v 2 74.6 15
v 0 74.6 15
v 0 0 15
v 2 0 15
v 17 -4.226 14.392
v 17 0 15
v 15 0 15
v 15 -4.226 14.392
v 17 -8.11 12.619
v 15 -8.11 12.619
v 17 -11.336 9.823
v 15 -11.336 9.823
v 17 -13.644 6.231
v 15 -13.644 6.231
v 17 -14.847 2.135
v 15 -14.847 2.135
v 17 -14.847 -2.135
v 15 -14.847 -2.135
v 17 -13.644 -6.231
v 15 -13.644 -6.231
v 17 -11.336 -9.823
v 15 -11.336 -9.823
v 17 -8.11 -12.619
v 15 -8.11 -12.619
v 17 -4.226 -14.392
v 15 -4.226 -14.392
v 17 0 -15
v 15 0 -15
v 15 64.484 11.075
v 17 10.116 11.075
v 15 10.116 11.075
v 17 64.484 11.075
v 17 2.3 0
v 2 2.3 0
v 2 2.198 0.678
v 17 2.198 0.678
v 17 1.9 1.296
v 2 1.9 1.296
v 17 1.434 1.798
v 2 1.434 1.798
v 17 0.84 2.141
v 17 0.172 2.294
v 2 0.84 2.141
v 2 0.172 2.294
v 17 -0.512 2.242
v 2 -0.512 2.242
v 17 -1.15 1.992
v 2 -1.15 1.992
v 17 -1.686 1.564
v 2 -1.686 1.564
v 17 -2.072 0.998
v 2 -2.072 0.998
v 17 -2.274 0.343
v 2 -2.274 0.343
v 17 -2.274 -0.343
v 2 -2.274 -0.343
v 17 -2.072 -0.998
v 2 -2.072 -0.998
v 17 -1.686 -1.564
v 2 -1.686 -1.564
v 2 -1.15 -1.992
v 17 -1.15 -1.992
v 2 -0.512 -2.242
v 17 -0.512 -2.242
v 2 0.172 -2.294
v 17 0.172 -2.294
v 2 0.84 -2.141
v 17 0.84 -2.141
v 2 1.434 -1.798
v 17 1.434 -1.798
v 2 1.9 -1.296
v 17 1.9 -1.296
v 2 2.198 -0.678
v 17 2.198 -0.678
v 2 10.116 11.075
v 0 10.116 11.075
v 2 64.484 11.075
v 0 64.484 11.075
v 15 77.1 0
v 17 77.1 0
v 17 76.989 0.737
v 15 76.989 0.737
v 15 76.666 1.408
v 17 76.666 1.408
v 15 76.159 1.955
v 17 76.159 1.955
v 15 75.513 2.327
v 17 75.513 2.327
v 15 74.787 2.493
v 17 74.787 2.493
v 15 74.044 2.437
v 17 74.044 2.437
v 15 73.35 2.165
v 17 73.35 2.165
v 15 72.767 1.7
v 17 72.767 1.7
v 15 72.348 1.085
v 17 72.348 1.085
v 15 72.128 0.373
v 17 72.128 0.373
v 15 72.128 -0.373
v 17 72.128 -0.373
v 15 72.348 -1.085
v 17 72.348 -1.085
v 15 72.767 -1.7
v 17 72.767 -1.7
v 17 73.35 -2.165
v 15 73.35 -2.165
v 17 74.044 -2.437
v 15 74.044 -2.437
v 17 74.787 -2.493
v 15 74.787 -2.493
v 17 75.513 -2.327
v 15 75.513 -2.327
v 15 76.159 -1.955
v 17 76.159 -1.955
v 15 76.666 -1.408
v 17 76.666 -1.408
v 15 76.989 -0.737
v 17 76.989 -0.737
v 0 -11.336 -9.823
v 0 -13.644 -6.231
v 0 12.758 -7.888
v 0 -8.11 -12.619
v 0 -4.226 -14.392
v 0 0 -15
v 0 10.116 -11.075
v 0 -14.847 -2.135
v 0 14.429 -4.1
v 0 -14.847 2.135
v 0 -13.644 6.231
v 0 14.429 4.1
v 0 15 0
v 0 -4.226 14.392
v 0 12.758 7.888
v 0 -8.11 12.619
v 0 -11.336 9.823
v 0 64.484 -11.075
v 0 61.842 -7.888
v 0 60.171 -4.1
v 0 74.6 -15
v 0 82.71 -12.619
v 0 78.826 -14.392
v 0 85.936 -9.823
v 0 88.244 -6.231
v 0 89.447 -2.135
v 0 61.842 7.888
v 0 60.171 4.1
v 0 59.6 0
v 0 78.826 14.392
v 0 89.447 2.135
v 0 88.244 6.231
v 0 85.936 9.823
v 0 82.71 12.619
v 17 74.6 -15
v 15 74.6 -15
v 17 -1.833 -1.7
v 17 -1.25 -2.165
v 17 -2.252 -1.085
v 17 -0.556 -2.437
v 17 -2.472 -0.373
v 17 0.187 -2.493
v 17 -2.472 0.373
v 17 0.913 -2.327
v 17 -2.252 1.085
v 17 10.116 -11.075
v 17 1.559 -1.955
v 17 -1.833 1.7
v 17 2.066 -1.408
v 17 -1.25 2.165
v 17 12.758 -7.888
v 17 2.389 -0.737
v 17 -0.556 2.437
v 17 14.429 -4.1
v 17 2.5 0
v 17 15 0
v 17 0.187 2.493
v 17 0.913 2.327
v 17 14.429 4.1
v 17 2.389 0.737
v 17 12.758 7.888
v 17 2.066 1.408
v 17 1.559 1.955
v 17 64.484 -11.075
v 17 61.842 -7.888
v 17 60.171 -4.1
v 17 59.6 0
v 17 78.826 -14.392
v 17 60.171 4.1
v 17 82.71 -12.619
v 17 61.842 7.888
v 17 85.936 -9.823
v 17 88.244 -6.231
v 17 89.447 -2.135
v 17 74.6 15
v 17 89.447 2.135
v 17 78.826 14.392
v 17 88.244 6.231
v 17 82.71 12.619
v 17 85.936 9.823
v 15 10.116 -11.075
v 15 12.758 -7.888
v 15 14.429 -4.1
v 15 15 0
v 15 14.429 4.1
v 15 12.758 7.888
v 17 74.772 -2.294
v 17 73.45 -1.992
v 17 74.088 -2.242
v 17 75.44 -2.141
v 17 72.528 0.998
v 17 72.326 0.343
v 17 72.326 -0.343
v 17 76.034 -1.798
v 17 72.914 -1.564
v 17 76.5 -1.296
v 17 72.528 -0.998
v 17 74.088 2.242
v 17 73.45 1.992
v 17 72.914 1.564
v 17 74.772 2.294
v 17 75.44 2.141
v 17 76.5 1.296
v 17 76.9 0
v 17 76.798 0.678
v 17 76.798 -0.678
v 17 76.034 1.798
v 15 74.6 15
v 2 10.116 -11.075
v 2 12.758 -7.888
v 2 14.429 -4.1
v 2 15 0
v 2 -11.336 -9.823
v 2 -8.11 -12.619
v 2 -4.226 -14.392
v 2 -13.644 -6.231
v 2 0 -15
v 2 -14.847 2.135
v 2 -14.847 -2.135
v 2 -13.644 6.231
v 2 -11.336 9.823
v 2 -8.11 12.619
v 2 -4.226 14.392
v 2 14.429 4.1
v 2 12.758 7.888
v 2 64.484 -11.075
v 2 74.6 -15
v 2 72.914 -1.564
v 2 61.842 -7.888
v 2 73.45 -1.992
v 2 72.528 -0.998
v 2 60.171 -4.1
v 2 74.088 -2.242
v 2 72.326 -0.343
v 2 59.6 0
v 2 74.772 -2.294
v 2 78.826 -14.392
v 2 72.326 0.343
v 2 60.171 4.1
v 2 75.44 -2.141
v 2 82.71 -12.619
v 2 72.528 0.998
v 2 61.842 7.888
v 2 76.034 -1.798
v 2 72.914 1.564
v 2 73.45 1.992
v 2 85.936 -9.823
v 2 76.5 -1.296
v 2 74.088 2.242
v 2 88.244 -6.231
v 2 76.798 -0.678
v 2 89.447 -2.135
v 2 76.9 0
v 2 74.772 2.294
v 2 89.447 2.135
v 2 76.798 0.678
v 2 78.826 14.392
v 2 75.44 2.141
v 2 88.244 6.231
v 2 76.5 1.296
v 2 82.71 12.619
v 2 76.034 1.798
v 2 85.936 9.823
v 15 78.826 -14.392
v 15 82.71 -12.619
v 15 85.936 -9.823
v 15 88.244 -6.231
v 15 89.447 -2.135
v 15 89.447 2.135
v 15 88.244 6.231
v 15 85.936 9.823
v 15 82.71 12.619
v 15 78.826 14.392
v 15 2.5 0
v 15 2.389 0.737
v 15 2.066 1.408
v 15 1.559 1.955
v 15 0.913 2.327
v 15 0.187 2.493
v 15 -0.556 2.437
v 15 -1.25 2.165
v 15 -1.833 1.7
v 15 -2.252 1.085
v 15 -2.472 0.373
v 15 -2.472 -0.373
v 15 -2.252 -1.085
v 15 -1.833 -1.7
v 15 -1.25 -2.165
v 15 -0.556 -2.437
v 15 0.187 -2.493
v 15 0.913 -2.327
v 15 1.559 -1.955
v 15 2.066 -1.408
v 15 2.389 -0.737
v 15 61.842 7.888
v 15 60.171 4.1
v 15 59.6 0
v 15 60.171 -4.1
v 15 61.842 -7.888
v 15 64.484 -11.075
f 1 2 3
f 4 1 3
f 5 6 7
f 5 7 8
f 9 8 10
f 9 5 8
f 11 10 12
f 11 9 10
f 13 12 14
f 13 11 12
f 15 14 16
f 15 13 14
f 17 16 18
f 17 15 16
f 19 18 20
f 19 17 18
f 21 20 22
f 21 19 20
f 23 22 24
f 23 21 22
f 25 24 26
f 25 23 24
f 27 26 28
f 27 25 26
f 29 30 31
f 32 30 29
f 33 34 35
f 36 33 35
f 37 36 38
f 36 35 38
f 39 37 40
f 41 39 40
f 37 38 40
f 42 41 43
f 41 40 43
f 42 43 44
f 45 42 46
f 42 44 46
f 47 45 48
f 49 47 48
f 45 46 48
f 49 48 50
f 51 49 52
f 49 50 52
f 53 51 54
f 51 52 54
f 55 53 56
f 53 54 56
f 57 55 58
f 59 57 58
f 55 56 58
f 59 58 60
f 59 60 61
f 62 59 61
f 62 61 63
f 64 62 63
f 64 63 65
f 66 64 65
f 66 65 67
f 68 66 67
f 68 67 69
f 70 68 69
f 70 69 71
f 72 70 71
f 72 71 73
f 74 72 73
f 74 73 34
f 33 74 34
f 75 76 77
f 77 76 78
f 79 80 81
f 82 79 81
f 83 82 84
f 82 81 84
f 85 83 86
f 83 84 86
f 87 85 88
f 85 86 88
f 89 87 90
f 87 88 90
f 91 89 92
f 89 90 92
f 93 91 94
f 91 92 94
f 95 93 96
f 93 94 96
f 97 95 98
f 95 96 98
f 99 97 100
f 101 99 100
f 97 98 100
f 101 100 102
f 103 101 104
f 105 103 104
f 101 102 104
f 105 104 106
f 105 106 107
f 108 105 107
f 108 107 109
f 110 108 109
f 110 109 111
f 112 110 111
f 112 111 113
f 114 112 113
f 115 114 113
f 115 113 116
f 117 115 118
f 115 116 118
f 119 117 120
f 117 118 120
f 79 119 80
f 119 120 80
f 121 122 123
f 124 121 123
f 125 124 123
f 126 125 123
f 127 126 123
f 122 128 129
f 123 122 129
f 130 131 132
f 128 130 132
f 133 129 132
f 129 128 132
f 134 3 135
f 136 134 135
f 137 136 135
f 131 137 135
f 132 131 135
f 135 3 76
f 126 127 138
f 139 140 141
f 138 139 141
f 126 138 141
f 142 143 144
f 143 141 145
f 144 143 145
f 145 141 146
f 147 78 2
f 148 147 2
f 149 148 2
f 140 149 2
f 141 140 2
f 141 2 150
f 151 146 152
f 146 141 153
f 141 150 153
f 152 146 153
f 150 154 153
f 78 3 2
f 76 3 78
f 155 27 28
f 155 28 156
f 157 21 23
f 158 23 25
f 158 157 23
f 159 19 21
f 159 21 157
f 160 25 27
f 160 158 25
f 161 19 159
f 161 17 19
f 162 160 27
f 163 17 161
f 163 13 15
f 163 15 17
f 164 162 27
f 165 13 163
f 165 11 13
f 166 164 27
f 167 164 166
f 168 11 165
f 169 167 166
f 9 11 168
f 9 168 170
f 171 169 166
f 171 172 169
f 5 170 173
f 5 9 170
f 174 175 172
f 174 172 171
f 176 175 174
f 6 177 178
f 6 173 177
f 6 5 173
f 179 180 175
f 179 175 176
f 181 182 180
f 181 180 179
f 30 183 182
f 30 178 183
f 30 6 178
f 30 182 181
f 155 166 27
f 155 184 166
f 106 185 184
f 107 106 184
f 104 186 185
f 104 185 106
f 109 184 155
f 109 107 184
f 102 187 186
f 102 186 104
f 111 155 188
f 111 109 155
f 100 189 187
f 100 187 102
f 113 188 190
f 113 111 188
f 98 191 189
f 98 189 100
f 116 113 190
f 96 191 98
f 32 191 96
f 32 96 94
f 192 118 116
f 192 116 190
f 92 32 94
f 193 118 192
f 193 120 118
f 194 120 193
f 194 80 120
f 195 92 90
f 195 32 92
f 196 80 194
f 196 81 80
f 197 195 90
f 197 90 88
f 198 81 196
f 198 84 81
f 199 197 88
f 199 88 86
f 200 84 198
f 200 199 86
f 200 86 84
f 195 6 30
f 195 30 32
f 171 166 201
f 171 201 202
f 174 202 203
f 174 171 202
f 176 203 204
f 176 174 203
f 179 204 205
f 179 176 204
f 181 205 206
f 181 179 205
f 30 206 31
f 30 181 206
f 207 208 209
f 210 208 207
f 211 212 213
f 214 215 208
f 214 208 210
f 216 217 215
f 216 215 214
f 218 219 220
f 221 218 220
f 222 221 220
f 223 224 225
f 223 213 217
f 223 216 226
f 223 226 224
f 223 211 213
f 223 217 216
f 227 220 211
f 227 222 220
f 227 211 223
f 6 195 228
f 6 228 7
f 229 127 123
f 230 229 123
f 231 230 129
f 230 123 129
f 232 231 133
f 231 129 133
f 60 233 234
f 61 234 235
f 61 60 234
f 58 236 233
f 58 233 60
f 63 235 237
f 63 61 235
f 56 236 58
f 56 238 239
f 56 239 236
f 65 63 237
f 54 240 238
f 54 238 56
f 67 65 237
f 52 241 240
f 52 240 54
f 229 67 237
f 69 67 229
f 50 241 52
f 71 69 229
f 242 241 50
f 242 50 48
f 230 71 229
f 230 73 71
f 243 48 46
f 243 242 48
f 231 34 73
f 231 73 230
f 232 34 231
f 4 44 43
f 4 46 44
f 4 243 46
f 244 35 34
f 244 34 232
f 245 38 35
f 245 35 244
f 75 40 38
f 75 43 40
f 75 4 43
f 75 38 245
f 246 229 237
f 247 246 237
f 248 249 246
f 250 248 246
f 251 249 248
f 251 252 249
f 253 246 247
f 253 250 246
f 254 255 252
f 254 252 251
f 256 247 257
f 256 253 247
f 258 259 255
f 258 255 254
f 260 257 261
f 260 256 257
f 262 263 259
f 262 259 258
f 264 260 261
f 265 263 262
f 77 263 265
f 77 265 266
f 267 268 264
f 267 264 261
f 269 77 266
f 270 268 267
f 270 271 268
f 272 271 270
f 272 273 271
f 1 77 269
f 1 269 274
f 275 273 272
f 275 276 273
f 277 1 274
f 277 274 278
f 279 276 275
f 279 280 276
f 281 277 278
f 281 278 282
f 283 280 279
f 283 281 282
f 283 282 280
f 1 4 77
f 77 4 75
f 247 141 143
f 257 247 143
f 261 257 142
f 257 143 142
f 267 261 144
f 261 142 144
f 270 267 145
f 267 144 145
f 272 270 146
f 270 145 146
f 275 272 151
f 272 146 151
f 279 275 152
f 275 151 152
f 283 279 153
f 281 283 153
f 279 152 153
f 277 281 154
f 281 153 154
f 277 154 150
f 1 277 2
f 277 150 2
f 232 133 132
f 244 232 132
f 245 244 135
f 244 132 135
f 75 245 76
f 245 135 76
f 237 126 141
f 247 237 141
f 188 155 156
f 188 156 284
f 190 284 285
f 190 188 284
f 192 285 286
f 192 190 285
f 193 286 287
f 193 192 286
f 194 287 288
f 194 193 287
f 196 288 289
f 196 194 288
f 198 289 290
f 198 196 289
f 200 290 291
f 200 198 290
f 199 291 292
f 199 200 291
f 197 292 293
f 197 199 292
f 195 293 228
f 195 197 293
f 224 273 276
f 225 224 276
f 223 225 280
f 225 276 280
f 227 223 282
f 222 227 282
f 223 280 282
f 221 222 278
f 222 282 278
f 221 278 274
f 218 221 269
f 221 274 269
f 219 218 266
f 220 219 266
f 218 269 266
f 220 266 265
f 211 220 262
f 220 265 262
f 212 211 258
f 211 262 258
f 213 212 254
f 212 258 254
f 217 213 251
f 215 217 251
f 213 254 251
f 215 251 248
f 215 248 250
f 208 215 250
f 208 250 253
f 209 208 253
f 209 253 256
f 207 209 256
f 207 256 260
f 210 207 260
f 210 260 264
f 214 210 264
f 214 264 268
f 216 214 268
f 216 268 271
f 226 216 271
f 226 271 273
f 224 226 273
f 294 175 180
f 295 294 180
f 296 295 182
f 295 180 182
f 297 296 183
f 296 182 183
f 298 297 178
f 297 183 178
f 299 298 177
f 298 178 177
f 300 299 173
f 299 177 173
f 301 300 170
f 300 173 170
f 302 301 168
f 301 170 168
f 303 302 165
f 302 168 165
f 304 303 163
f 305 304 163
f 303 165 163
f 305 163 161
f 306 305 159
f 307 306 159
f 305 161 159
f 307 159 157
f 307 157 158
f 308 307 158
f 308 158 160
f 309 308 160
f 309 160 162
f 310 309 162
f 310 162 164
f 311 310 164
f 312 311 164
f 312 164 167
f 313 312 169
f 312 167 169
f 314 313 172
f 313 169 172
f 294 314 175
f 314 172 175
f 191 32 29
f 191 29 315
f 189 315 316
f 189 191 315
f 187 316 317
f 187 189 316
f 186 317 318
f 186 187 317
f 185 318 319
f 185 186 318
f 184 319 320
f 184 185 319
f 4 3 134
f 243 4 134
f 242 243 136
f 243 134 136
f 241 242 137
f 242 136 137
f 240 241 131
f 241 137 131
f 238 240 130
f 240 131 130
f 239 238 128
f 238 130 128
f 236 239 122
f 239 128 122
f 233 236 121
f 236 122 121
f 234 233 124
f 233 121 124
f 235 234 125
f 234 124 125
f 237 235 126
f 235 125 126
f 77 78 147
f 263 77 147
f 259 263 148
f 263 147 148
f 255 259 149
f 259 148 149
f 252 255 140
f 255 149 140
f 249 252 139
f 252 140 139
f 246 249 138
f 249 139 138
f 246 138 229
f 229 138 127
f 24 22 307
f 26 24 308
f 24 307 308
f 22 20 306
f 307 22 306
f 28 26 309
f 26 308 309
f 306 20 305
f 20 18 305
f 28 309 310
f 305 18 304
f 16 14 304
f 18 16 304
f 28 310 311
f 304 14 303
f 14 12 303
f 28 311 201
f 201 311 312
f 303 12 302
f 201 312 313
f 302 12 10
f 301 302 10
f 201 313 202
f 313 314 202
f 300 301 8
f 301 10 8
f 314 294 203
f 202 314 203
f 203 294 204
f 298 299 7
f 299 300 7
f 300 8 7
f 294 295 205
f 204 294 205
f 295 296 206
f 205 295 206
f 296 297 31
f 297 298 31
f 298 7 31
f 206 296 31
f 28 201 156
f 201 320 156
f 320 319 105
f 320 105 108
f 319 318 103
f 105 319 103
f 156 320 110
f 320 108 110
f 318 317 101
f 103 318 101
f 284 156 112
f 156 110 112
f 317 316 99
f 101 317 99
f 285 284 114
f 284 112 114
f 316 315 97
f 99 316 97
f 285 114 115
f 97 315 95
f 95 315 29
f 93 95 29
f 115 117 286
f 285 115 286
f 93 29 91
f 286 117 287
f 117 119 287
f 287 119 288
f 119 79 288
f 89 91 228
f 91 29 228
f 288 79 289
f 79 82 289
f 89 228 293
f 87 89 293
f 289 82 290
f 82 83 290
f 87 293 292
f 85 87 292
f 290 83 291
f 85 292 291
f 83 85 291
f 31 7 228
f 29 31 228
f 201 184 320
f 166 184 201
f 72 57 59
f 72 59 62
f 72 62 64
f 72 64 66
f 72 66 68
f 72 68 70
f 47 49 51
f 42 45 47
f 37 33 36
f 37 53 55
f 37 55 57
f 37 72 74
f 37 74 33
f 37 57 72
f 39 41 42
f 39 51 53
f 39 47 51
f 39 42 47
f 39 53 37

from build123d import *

# Parameters (mm, degrees)
F0_R     = 2.3
F1_DEPTH = 2
F2_DEPTH = 17
F3_R     = 2.5
F4_DEPTH = 2


with BuildPart() as f1:
    # F0 (on Right) → F1 (new body)
    with BuildSketch(Plane.YZ):
        with BuildLine():
            ThreePointArc((10.1162621493, -11.0752535017), (13.7248667068, -6.0521098701), (15, 0))
            ThreePointArc((15, 0), (13.7248667068, 6.0521098701), (10.1162621493, 11.0752535017))
            Line((10.1162621493, 11.0752535017), (10.1162621493, 7.3424274001))
            ThreePointArc((10.1162621493, 7.3424274001), (11.8891395161, 3.8598395778), (12.5, 0))
            ThreePointArc((12.5, 0), (11.8891395161, -3.8598395778), (10.1162621493, -7.3424274001))
            Line((10.1162621493, -7.3424274001), (10.1162621493, -11.0752535017))
        make_face()
        with BuildLine():
            ThreePointArc((12.5, 0), (11.8891395161, 3.8598395778), (10.1162621493, 7.3424274001))
            Line((10.1162621493, 7.3424274001), (10.1162621493, -7.3424274001))
            ThreePointArc((10.1162621493, -7.3424274001), (11.8891395161, -3.8598395778), (12.5, 0))
        make_face()
        with BuildLine():
            Line((10.1162621493, -7.3424274001), (10.1162621493, 7.3424274001))
            ThreePointArc((10.1162621493, 7.3424274001), (-12.5, 0), (10.1162621493, -7.3424274001))
        make_face()
        Circle(F0_R, mode=Mode.SUBTRACT)
        with BuildLine():
            Line((10.1162621493, 7.3424274001), (10.1162621493, 11.0752535017))
            ThreePointArc((10.1162621493, 11.0752535017), (5.4254583896, 13.9844342489), (0, 15))
            ThreePointArc((0, 15), (-15, 0), (0, -15))
            ThreePointArc((0, -15), (5.4254583896, -13.9844342489), (10.1162621493, -11.0752535017))
            Line((10.1162621493, -11.0752535017), (10.1162621493, -7.3424274001))
            ThreePointArc((10.1162621493, -7.3424274001), (-12.5, 0), (10.1162621493, 7.3424274001))
        make_face()
        with BuildLine():
            ThreePointArc((0, 15), (5.4254583896, 13.9844342489), (10.1162621493, 11.0752535017))
            Line((10.1162621493, 11.0752535017), (64.4837378507, 11.0752535017))
            ThreePointArc((64.4837378507, 11.0752535017), (69.1745416104, 13.9844342489), (74.6, 15))
            Line((74.6, 15), (0, 15))
        make_face()
        with BuildLine():
            Line((64.4837378507, -11.0752535017), (10.1162621493, -11.0752535017))
            ThreePointArc((10.1162621493, -11.0752535017), (5.4254583896, -13.9844342489), (0, -15))
            Line((0, -15), (74.6, -15))
            ThreePointArc((74.6, -15), (69.1745416104, -13.9844342489), (64.4837378507, -11.0752535017))
        make_face()
        with BuildLine():
            ThreePointArc((74.6, 15), (69.1745416104, 13.9844342489), (64.4837378507, 11.0752535017))
            Line((64.4837378507, 11.0752535017), (64.4837378507, 7.3424274001))
            ThreePointArc((64.4837378507, 7.3424274001), (78.4598395778, 11.8891395161), (87.1, 0))
            ThreePointArc((87.1, 0), (78.4598395778, -11.8891395161), (64.4837378507, -7.3424274001))
            Line((64.4837378507, -7.3424274001), (64.4837378507, -11.0752535017))
            ThreePointArc((64.4837378507, -11.0752535017), (69.1745416104, -13.9844342489), (74.6, -15))
            ThreePointArc((74.6, -15), (85.2066017178, -10.6066017178), (89.6, 0))
            ThreePointArc((89.6, 0), (85.2066017178, 10.6066017178), (74.6, 15))
        make_face()
        with BuildLine():
            ThreePointArc((87.1, 0), (78.4598395778, 11.8891395161), (64.4837378507, 7.3424274001))
            Line((64.4837378507, 7.3424274001), (64.4837378507, -7.3424274001))
            ThreePointArc((64.4837378507, -7.3424274001), (78.4598395778, -11.8891395161), (87.1, 0))
        make_face()
        with Locations((74.6, 0)):
            Circle(F0_R, mode=Mode.SUBTRACT)
        with BuildLine():
            Line((64.4837378507, -7.3424274001), (64.4837378507, 7.3424274001))
            ThreePointArc((64.4837378507, 7.3424274001), (62.1, 0), (64.4837378507, -7.3424274001))
        make_face()
        with BuildLine():
            Line((64.4837378507, 7.3424274001), (64.4837378507, 11.0752535017))
            ThreePointArc((64.4837378507, 11.0752535017), (59.6, 0), (64.4837378507, -11.0752535017))
            Line((64.4837378507, -11.0752535017), (64.4837378507, -7.3424274001))
            ThreePointArc((64.4837378507, -7.3424274001), (62.1, 0), (64.4837378507, 7.3424274001))
        make_face()
    extrude(amount=F1_DEPTH)

    # F0 (on Right) → F2 (join)
    with BuildSketch(Plane.YZ):
        Circle(F0_R)
        with Locations((74.6, 0)):
            Circle(F0_R)
    extrude(amount=F2_DEPTH)


with BuildPart() as f4:
    # F3 (on face) → F4 (new body)
    with BuildSketch(Plane.YZ.offset(17)):
        with BuildLine():
            ThreePointArc((74.6, -15), (89.6, 0), (74.6, 15))
            Line((74.6, 15), (0, 15))
            ThreePointArc((0, 15), (-15, 0), (0, -15))
            Line((0, -15), (74.6, -15))
        make_face()
        Circle(F3_R, mode=Mode.SUBTRACT)
        with BuildLine():
            Line((64.4837378507, -11.0752535017), (10.1162621493, -11.0752535017))
            ThreePointArc((10.1162621493, -11.0752535017), (15, 0), (10.1162621493, 11.0752535017))
            Line((10.1162621493, 11.0752535017), (64.4837378507, 11.0752535017))
            ThreePointArc((64.4837378507, 11.0752535017), (59.6, 0), (64.4837378507, -11.0752535017))
        make_face(mode=Mode.SUBTRACT)
        with Locations((74.6, 0)):
            Circle(F3_R, mode=Mode.SUBTRACT)
    extrude(amount=-F4_DEPTH)


solid = Compound([f1.part, f4.part])
